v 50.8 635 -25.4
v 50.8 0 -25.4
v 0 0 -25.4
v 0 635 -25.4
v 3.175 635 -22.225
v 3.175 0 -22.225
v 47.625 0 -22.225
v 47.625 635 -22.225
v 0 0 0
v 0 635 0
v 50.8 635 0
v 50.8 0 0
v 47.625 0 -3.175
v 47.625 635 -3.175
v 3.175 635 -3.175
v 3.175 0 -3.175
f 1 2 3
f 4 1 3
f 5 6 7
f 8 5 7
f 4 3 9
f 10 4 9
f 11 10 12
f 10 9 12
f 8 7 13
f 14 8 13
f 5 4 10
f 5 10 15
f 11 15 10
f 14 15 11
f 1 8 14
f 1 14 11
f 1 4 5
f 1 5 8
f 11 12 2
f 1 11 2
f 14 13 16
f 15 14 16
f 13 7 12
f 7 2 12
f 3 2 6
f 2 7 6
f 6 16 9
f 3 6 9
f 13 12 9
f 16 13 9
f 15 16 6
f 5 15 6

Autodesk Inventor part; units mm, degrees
ref_plane "YZ Plane" through (0, 0, 0) normal (1, 0, 0) x (0, 1, 0)
ref_plane "XZ Plane" through (0, 0, 0) normal (0, 1, 0) x (-1, 0, 0)
ref_plane "XY Plane" through (0, 0, 0) normal (0, 0, 1) x (1, 0, 0)
sketch "Sketch1" plane through (0, 0, 0) normal (0, 1, 0) x (-1, 0, 0)
  line L0 (0, 0) -> (-50.8, 0)
  line L1 (-50.8, 0) -> (-50.8, -25.4)
  line L2 (-50.8, -25.4) -> (0, -25.4)
  line L3 (0, -25.4) -> (0, 0)
  line L4 (-3.175, -22.225) -> (-47.625, -22.225)
  line L5 (-47.625, -22.225) -> (-47.625, -3.175)
  line L6 (-47.625, -3.175) -> (-3.175, -3.175)
  line L7 (-3.175, -3.175) -> (-3.175, -22.225)
  dimension "d0" = 25.4
  dimension "d1" = 50.8
  dimension "d2" = 3.175
  dimension "d3" = 3.175
  dimension "d4" = 3.175
  dimension "d5" = 3.175
extrude "Extrusion1" add sketch "Sketch1" along normal blind 736.6
sketch "Sketch2" plane through (0, 736.6, 0) normal (0, 1, 0) x (1, 0, 0)
  line L0 (-32.6558, 46.2997) -> (107.3615, 46.2997)
  line L1 (107.3615, 46.2997) -> (107.3615, -26.8404)
  line L2 (107.3615, -26.8404) -> (-32.6558, -26.8404)
  line L3 (-32.6558, -26.8404) -> (-32.6558, 46.2997)
  point P0 (0, 0)
extrude "Extrusion2" cut sketch "Sketch2" against normal blind 101.6
properties part number "29in 2x1" material "Aluminum 6061"
